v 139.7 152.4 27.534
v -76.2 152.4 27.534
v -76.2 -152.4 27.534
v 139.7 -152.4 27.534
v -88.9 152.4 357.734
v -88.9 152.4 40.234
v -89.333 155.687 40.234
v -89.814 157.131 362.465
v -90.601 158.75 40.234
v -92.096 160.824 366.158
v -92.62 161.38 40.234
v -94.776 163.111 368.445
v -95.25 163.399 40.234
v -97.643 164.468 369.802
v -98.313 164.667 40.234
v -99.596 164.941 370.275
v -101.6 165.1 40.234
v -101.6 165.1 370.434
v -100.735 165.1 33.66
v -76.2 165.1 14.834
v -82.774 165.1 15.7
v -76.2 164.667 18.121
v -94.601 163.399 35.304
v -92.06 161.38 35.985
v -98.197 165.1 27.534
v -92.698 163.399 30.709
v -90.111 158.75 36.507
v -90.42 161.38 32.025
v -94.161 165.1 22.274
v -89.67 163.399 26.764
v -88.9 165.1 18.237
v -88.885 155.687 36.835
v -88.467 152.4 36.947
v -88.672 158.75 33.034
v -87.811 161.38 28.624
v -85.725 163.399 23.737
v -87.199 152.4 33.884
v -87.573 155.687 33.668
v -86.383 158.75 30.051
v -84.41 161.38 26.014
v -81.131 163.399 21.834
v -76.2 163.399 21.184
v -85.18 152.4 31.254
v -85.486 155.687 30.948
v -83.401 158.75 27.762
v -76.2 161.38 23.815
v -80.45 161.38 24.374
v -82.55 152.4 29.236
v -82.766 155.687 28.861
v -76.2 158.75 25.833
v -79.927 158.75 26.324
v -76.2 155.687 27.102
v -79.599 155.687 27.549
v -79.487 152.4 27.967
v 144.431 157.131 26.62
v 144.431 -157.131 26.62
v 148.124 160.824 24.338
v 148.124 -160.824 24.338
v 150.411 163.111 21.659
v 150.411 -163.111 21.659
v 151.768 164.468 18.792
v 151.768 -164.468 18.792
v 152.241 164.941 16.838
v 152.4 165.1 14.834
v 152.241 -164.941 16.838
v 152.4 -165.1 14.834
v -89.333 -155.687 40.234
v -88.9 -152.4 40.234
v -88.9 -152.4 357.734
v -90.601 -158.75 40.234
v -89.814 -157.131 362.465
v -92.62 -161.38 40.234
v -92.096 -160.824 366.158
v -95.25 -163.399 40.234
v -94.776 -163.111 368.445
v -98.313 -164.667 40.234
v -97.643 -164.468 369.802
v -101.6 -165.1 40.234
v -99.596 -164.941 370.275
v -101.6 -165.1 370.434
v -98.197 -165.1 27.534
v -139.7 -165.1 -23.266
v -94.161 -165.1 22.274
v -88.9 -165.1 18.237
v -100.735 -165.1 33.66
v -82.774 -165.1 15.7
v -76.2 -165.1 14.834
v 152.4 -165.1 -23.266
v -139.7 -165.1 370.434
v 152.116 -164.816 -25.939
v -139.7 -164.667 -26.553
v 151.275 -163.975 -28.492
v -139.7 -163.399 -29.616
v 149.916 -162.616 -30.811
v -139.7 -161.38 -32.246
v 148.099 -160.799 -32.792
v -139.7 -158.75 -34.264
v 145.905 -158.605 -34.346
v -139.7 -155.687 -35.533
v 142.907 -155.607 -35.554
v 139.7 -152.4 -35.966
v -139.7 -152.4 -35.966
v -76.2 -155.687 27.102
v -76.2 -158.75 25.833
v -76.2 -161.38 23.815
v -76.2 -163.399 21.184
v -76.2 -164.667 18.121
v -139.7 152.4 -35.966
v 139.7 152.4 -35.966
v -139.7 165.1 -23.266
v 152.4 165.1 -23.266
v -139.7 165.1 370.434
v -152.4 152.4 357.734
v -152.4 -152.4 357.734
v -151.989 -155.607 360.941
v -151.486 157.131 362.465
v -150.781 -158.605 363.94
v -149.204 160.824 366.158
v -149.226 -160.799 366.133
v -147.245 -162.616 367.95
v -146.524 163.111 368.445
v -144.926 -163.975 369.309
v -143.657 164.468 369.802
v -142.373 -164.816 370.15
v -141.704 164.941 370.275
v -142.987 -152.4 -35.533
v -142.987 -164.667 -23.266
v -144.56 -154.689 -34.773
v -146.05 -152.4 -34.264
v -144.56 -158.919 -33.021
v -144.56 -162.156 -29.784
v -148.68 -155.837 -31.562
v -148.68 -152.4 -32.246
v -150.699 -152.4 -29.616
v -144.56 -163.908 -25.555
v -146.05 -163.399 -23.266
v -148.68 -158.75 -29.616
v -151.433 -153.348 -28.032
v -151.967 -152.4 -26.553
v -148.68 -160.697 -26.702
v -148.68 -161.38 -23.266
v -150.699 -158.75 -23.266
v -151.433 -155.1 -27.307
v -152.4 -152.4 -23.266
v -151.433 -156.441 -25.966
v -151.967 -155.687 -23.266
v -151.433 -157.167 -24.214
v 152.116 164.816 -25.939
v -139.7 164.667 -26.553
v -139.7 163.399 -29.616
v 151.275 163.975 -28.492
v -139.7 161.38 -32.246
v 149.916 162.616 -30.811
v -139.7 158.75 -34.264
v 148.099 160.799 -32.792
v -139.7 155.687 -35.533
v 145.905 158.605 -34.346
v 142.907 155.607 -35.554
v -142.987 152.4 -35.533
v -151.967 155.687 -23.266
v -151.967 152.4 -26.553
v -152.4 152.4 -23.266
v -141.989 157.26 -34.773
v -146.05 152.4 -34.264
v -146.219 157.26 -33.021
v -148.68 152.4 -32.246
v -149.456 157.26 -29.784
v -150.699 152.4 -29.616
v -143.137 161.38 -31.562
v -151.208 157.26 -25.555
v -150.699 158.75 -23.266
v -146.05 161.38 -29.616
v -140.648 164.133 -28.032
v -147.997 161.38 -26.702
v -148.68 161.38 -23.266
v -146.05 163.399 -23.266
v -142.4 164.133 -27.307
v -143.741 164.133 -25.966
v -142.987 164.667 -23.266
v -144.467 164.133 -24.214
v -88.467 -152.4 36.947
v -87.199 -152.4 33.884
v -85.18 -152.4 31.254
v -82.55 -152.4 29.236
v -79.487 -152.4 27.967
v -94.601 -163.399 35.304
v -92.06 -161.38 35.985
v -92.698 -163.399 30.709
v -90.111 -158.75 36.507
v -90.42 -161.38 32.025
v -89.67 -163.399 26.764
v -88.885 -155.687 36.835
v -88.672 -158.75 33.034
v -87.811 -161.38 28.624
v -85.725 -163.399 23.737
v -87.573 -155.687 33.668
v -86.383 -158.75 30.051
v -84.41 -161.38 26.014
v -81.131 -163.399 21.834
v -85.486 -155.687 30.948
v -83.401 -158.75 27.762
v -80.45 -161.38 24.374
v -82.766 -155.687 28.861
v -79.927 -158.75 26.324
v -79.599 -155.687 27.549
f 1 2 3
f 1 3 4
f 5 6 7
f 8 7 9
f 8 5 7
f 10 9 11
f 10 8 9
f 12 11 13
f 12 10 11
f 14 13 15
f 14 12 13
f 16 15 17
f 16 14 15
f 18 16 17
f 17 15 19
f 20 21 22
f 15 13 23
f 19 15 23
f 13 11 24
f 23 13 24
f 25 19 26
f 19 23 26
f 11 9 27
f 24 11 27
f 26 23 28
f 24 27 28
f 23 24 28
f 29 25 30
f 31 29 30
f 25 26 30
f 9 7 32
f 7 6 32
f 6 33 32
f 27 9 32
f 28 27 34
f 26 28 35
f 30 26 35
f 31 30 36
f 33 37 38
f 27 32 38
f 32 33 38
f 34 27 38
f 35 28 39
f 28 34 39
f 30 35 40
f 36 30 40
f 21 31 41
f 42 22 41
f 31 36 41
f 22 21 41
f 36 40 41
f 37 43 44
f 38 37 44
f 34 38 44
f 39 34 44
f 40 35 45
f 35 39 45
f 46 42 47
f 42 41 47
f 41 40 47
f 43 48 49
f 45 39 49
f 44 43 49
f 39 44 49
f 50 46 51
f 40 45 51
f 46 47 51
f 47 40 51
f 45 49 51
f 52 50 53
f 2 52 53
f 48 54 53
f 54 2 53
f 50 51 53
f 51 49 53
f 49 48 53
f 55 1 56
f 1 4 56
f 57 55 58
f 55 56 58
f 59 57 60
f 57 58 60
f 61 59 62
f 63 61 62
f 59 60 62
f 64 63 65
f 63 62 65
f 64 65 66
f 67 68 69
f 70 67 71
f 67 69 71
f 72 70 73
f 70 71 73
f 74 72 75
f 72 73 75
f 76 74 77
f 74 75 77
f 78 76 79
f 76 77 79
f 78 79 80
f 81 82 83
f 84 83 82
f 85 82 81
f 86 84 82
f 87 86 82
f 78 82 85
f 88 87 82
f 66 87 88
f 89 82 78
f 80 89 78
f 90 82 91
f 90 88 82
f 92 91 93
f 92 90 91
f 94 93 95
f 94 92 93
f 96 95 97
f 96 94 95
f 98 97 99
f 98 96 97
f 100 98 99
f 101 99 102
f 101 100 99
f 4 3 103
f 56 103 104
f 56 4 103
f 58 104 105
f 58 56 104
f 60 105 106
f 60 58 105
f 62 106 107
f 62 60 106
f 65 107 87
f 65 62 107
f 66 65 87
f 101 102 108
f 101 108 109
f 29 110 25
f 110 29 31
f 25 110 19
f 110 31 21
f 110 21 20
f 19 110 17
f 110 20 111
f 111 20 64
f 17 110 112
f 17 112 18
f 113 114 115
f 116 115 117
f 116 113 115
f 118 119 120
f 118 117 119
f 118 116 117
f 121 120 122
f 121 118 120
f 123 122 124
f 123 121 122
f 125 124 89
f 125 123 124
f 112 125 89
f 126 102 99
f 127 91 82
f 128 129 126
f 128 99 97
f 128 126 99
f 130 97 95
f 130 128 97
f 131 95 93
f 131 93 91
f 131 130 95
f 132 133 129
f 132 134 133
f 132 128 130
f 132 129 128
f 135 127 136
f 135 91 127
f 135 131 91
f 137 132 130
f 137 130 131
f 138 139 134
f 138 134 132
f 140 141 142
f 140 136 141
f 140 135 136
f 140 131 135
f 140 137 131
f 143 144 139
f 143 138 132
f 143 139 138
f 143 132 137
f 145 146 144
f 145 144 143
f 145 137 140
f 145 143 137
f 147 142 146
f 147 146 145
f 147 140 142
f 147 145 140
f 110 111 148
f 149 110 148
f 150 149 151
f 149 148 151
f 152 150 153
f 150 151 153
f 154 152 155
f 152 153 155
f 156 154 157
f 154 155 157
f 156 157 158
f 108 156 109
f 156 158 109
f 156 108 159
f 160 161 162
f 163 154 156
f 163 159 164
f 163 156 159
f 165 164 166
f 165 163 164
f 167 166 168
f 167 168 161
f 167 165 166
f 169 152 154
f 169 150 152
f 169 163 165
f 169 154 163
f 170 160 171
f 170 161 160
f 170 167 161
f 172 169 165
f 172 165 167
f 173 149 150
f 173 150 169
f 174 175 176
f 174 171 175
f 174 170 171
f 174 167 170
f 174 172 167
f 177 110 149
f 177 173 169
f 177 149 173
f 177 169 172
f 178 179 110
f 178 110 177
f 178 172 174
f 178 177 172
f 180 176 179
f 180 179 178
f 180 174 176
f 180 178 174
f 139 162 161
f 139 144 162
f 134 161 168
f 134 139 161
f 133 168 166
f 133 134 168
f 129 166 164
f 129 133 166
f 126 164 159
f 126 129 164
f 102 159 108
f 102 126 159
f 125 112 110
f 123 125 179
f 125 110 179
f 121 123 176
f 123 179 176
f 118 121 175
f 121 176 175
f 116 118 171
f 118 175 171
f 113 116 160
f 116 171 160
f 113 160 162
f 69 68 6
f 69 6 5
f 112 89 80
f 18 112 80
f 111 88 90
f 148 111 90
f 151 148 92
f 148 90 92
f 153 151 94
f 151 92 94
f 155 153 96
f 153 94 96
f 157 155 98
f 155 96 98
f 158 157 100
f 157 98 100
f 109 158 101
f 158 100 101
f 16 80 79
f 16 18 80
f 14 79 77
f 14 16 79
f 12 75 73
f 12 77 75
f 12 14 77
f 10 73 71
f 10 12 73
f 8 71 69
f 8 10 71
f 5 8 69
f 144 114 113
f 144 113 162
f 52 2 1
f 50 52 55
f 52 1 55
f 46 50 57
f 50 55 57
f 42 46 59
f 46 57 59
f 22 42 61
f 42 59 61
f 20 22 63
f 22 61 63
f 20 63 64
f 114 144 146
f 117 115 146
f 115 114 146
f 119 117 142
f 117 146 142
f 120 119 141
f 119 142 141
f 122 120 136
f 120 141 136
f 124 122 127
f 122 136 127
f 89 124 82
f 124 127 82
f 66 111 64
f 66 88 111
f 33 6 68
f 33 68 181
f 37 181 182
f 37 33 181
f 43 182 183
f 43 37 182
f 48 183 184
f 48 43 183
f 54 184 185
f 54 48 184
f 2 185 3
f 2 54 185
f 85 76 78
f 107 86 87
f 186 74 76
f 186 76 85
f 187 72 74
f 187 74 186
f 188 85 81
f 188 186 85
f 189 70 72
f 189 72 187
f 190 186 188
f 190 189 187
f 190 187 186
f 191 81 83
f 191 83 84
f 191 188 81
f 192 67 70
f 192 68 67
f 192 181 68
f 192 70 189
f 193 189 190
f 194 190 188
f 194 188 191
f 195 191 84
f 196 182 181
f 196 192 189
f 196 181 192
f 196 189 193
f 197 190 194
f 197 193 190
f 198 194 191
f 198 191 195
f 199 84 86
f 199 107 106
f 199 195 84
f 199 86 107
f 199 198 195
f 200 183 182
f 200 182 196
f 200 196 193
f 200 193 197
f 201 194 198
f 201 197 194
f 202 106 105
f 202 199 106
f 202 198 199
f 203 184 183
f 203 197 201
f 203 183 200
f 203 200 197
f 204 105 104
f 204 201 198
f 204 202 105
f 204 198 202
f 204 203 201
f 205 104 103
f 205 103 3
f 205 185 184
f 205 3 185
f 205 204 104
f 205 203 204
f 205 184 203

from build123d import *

# Parameters (mm, degrees)
F0_W         = 63.5
F0_H         = 342.9
F0_H_2       = 63.5
F0_W_2       = 241.3
F1_DEPTH     = 165.1
F2_R         = 12.7
F3_R         = 12.7
F4_T1_DEPTH  = 425.45
F4_T3_DEPTH  = 393.7
F4_S7_W      = 12.7
F4_S7_H      = 12.7
F4_T8_DEPTH  = 12.7
F4_S13_W     = 12.7
F4_S13_H     = 12.7
F4_T14_DEPTH = 12.7


# Not quite as in the source:
# - a fillet or chamfer that OpenCascade refuses, or shapes differently, is made with other operations: its cross-section is extruded or revolved along the edge and cut away or added


with BuildPart() as f1:
    # F0 (on Front) → F1 (new body, symmetric)
    with BuildSketch(Plane.XZ):
        with Locations((-120.65, 198.9844056189)):
            Rectangle(F0_W, F0_H)
        with Locations((-120.65, -4.2155943811)):
            Rectangle(F0_W, F0_H_2)
        with Locations((31.75, -4.2155943811)):
            Rectangle(F0_W_2, F0_H_2)
    extrude(amount=F1_DEPTH, both=True)

    # F2
    f2_edges = [f1.edges().sort_by_distance(p)[0] for p in [
        (31.75, -165.1, 27.534406),
        (152.4, 0, 27.534406),
        (31.75, 165.1, 27.534406),
        (-88.9, 0, 27.534406),
        (-88.9, 165.1, 198.984406),
        (-88.9, -165.1, 198.984406),
        (-88.9, 0, 370.434406),
    ]]
    fillet(f2_edges, radius=F2_R)

    # F3
    f3_edges = [f1.edges().sort_by_distance(p)[0] for p in [
        (0, -165.1, -35.965594),
        (152.4, 0, -35.965594),
        (0, 165.1, -35.965594),
        (-152.4, 0, -35.965594),
    ]]
    fillet(f3_edges, radius=F3_R)

    # F4: fillet of radius 12.7 on 3 edges, made by hand

    # F4_s2 → F4_t1 (cut)
    with BuildSketch(Plane.XY.offset(-23.2655943811)):
        with BuildLine():
            ThreePointArc((-152.4, -152.4), (-148.6802561211, -161.3802561211), (-139.7, -165.1))
            Line((-139.7, -165.1), (-152.4, -165.1))
            Line((-152.4, -165.1), (-152.4, -152.4))
        make_face()
        with BuildLine():
            ThreePointArc((-139.7, 165.1), (-148.6802561211, 161.3802561211), (-152.4, 152.4))
            Line((-152.4, 152.4), (-152.4, 165.1))
            Line((-152.4, 165.1), (-139.7, 165.1))
        make_face()
    extrude(amount=F4_T1_DEPTH, mode=Mode.SUBTRACT)

    # F4_s4 → F4_t3 (cut)
    with BuildSketch(Plane.XZ.offset(-196.85)):
        with BuildLine():
            ThreePointArc((-152.4, 357.7344056189), (-148.6802561211, 366.71466174), (-139.7, 370.4344056189))
            Line((-139.7, 370.4344056189), (-152.4, 370.4344056189))
            Line((-152.4, 370.4344056189), (-152.4, 357.7344056189))
        make_face()
    extrude(amount=F4_T3_DEPTH, mode=Mode.SUBTRACT)


with BuildPart() as f4_tool6:
    # F4_s7 → F4_t8 (new body)
    with BuildSketch(Plane.XZ.offset(-152.4)):
        with Locations((-146.05, -29.6155943811)):
            Rectangle(F4_S7_W, F4_S7_H)
    extrude(amount=-F4_T8_DEPTH)

    # F4_s9 → F4_t10 (revolve, cut)
    with BuildSketch(Plane(origin=(-139.7, 152.4, -23.2655943811), x_dir=(0.7071067812, 0, 0.7071067812), z_dir=(-0.7071067812, 0, 0.7071067812))):
        with BuildLine():
            ThreePointArc((0, -12.7), (12.7, 0), (0, 12.7))
            Line((0, 12.7), (0, -12.7))
        make_face()
    revolve(axis=Axis((-139.7, 152.4, -23.2655943811), (0, 1, 0)), mode=Mode.SUBTRACT)


with BuildPart() as f1_1:
    add(f1.part)

    # F4_t5: cut F4_tool6
    add(f4_tool6.part, mode=Mode.SUBTRACT)


with BuildPart() as f4_tool12:
    # F4_s13 → F4_t14 (new body)
    with BuildSketch(Plane.YZ.offset(-139.7)):
        with Locations((-158.75, -29.6155943811)):
            Rectangle(F4_S13_W, F4_S13_H)
    extrude(amount=-F4_T14_DEPTH)

    # F4_s15 → F4_t16 (revolve, cut)
    with BuildSketch(Plane(origin=(-139.7, -152.4, -23.2655943811), x_dir=(0, 0.7071067812, 0.7071067812), z_dir=(0, -0.7071067812, 0.7071067812))):
        with BuildLine():
            ThreePointArc((0, -12.7), (12.7, 0), (0, 12.7))
            Line((0, 12.7), (0, -12.7))
        make_face()
    revolve(axis=Axis((-139.7, -152.4, -23.2655943811), (-1, 0, 0)), mode=Mode.SUBTRACT)


with BuildPart() as f1_2:
    add(f1_1.part)

    # F4_t11: cut F4_tool12
    add(f4_tool12.part, mode=Mode.SUBTRACT)


solid = f1_2.part
